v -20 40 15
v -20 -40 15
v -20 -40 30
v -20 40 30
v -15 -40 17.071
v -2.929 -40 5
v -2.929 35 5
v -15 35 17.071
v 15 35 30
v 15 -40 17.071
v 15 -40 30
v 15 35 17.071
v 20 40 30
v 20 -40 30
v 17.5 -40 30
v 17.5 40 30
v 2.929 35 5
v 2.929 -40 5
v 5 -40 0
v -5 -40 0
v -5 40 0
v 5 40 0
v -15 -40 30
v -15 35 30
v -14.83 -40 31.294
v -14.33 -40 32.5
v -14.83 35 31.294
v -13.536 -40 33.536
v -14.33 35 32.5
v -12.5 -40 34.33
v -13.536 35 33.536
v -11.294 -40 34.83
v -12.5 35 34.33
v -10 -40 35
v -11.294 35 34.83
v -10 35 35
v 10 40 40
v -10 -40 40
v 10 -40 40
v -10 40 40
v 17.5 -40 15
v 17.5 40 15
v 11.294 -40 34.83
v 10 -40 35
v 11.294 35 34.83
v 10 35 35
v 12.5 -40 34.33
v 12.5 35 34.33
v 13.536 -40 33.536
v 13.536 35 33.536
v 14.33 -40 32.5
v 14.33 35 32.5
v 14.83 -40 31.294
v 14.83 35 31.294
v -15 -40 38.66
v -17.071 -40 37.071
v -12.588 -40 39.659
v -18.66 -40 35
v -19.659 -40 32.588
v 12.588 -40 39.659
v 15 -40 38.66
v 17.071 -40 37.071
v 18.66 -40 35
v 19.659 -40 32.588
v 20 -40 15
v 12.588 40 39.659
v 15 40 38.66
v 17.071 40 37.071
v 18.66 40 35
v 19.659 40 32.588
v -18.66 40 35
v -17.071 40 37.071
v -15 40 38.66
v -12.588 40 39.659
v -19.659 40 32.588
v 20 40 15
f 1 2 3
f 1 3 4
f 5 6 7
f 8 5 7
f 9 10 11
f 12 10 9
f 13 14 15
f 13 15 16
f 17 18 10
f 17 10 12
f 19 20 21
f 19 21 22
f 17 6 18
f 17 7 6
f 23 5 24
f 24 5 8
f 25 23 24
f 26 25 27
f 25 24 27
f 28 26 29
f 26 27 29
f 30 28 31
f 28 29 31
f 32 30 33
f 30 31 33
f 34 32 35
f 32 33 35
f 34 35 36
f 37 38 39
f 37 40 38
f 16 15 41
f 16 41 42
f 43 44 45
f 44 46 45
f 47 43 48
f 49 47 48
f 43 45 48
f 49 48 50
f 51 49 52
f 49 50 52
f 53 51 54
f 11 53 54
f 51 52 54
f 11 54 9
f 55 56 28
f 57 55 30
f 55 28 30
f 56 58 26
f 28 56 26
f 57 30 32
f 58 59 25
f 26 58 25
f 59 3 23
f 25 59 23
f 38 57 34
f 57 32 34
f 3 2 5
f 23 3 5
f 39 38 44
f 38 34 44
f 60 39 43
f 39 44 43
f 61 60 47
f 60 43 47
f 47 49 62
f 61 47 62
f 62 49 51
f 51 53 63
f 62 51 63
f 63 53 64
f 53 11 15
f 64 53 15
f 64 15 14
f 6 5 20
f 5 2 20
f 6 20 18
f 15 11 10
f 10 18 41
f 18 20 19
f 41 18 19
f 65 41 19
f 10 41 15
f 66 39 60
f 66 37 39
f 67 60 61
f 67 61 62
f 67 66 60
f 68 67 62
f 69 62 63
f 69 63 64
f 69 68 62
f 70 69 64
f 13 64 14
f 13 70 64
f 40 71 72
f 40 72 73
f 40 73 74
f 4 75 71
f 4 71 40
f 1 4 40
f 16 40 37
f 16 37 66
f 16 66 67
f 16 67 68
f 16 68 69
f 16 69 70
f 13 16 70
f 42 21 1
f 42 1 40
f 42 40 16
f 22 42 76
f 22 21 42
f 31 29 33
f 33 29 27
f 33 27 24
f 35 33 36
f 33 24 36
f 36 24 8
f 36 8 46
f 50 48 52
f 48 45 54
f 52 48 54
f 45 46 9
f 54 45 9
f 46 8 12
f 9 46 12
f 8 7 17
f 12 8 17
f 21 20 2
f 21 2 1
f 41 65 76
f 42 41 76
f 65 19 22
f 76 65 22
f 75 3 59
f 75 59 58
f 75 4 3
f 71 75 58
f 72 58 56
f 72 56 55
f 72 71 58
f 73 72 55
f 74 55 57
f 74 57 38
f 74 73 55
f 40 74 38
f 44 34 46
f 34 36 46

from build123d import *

# Parameters (mm, degrees)
F0_W      = 40
F0_H      = 80
F1_DEPTH  = 40
F2_SIZE   = 15
F3_R      = 10
F4_T      = -5
F1_FACE_W = 80
F1_FACE_H = 15
F5_DEPTH  = 2.5


with BuildPart() as f1:
    # F0 (on Top) → F1 (new body)
    with BuildSketch(Plane.XY):
        Rectangle(F0_W, F0_H)
    extrude(amount=F1_DEPTH)

    # F2
    f2_edges = [f1.edges().sort_by_distance(p)[0] for p in [
        (-20, 0, 0),
        (20, 0, 0),
    ]]
    chamfer(f2_edges, length=F2_SIZE)

    # F3
    f3_edges = [f1.edges().sort_by_distance(p)[0] for p in [
        (-20, 0, 40),
        (20, 0, 40),
    ]]
    fillet(f3_edges, radius=F3_R)

    # F4
    f4_openings = [f1.faces().sort_by_distance(p)[0] for p in [
        (0, -40, 21.961191),
    ]]
    offset(amount=F4_T, openings=f4_openings)

    # F1_face (on face) → F5 (cut)
    with BuildSketch(Plane(origin=(20, 0, 22.5), x_dir=(0, 1, 0), z_dir=(1, 0, 0))):
        Rectangle(F1_FACE_W, F1_FACE_H)
    extrude(amount=-F5_DEPTH, mode=Mode.SUBTRACT)


solid = f1.part
